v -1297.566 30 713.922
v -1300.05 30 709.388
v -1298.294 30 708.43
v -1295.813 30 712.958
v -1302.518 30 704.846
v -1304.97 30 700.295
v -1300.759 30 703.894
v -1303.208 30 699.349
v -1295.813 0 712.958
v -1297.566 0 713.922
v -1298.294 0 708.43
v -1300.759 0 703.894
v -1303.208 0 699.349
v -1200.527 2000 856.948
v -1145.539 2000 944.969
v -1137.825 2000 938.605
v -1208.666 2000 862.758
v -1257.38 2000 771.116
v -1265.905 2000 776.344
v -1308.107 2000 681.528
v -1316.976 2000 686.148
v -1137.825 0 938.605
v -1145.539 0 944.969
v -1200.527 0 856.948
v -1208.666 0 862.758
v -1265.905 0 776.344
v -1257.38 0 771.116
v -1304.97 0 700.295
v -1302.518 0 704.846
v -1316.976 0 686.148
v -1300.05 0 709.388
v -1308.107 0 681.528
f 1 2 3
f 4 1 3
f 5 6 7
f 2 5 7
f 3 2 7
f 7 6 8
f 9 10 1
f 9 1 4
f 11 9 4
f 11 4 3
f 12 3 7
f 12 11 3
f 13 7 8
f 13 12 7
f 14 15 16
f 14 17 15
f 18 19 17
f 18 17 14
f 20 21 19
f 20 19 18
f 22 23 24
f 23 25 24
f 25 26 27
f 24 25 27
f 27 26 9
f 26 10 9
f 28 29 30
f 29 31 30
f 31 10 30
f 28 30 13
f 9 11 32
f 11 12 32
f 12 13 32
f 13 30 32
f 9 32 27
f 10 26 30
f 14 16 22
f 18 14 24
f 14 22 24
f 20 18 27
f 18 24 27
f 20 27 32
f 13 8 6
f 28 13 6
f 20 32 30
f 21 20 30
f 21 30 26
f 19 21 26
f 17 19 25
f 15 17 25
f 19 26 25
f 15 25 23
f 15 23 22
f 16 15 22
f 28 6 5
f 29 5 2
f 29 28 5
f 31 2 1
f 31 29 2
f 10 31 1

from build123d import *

# Parameters (mm, degrees)
EXTRUDE_3_DEPTH     = 2000
CUT_EXTRUDE_1_DEPTH = 30


with BuildPart() as part:
    # 草图1 → 凸台-拉伸3 (new body)
    with BuildSketch(Plane(origin=(0, 0, 0), x_dir=(1, 0, 0), z_dir=(0, 1, 0))):
        with BuildLine():
            Line((-1145.538694667, -944.968834947), (-1137.824629383, -938.605408449))
            ThreePointArc((-1137.824629383, -938.605408449), (-1229.702487971, -814.528569836), (-1308.107468768, -681.527585761))
            Line((-1308.107468768, -681.527585761), (-1316.97599398, -686.148111766))
            ThreePointArc((-1316.97599398, -686.148111766), (-1238.039453991, -820.050797428), (-1145.538694667, -944.968834947))
        make_face()
    extrude(amount=EXTRUDE_3_DEPTH)

    # 草图2 → 切除-拉伸1 (cut)
    with BuildSketch(Plane(origin=(0, 0, 0), x_dir=(1, 0, 0), z_dir=(0, 1, 0))):
        with BuildLine():
            Line((-1303.208186932, -699.349284345), (-1304.970469808, -700.294989936))
            ThreePointArc((-1304.970469808, -700.294989936), (-1301.285862357, -707.118168647), (-1297.565579497, -713.921961355))
            Line((-1297.565579497, -713.921961355), (-1295.813296472, -712.957853373))
            ThreePointArc((-1295.813296472, -712.957853373), (-1299.528555318, -706.16324877), (-1303.208186932, -699.349284345))
        make_face()
    extrude(amount=CUT_EXTRUDE_1_DEPTH, mode=Mode.SUBTRACT)


solid = part.part
